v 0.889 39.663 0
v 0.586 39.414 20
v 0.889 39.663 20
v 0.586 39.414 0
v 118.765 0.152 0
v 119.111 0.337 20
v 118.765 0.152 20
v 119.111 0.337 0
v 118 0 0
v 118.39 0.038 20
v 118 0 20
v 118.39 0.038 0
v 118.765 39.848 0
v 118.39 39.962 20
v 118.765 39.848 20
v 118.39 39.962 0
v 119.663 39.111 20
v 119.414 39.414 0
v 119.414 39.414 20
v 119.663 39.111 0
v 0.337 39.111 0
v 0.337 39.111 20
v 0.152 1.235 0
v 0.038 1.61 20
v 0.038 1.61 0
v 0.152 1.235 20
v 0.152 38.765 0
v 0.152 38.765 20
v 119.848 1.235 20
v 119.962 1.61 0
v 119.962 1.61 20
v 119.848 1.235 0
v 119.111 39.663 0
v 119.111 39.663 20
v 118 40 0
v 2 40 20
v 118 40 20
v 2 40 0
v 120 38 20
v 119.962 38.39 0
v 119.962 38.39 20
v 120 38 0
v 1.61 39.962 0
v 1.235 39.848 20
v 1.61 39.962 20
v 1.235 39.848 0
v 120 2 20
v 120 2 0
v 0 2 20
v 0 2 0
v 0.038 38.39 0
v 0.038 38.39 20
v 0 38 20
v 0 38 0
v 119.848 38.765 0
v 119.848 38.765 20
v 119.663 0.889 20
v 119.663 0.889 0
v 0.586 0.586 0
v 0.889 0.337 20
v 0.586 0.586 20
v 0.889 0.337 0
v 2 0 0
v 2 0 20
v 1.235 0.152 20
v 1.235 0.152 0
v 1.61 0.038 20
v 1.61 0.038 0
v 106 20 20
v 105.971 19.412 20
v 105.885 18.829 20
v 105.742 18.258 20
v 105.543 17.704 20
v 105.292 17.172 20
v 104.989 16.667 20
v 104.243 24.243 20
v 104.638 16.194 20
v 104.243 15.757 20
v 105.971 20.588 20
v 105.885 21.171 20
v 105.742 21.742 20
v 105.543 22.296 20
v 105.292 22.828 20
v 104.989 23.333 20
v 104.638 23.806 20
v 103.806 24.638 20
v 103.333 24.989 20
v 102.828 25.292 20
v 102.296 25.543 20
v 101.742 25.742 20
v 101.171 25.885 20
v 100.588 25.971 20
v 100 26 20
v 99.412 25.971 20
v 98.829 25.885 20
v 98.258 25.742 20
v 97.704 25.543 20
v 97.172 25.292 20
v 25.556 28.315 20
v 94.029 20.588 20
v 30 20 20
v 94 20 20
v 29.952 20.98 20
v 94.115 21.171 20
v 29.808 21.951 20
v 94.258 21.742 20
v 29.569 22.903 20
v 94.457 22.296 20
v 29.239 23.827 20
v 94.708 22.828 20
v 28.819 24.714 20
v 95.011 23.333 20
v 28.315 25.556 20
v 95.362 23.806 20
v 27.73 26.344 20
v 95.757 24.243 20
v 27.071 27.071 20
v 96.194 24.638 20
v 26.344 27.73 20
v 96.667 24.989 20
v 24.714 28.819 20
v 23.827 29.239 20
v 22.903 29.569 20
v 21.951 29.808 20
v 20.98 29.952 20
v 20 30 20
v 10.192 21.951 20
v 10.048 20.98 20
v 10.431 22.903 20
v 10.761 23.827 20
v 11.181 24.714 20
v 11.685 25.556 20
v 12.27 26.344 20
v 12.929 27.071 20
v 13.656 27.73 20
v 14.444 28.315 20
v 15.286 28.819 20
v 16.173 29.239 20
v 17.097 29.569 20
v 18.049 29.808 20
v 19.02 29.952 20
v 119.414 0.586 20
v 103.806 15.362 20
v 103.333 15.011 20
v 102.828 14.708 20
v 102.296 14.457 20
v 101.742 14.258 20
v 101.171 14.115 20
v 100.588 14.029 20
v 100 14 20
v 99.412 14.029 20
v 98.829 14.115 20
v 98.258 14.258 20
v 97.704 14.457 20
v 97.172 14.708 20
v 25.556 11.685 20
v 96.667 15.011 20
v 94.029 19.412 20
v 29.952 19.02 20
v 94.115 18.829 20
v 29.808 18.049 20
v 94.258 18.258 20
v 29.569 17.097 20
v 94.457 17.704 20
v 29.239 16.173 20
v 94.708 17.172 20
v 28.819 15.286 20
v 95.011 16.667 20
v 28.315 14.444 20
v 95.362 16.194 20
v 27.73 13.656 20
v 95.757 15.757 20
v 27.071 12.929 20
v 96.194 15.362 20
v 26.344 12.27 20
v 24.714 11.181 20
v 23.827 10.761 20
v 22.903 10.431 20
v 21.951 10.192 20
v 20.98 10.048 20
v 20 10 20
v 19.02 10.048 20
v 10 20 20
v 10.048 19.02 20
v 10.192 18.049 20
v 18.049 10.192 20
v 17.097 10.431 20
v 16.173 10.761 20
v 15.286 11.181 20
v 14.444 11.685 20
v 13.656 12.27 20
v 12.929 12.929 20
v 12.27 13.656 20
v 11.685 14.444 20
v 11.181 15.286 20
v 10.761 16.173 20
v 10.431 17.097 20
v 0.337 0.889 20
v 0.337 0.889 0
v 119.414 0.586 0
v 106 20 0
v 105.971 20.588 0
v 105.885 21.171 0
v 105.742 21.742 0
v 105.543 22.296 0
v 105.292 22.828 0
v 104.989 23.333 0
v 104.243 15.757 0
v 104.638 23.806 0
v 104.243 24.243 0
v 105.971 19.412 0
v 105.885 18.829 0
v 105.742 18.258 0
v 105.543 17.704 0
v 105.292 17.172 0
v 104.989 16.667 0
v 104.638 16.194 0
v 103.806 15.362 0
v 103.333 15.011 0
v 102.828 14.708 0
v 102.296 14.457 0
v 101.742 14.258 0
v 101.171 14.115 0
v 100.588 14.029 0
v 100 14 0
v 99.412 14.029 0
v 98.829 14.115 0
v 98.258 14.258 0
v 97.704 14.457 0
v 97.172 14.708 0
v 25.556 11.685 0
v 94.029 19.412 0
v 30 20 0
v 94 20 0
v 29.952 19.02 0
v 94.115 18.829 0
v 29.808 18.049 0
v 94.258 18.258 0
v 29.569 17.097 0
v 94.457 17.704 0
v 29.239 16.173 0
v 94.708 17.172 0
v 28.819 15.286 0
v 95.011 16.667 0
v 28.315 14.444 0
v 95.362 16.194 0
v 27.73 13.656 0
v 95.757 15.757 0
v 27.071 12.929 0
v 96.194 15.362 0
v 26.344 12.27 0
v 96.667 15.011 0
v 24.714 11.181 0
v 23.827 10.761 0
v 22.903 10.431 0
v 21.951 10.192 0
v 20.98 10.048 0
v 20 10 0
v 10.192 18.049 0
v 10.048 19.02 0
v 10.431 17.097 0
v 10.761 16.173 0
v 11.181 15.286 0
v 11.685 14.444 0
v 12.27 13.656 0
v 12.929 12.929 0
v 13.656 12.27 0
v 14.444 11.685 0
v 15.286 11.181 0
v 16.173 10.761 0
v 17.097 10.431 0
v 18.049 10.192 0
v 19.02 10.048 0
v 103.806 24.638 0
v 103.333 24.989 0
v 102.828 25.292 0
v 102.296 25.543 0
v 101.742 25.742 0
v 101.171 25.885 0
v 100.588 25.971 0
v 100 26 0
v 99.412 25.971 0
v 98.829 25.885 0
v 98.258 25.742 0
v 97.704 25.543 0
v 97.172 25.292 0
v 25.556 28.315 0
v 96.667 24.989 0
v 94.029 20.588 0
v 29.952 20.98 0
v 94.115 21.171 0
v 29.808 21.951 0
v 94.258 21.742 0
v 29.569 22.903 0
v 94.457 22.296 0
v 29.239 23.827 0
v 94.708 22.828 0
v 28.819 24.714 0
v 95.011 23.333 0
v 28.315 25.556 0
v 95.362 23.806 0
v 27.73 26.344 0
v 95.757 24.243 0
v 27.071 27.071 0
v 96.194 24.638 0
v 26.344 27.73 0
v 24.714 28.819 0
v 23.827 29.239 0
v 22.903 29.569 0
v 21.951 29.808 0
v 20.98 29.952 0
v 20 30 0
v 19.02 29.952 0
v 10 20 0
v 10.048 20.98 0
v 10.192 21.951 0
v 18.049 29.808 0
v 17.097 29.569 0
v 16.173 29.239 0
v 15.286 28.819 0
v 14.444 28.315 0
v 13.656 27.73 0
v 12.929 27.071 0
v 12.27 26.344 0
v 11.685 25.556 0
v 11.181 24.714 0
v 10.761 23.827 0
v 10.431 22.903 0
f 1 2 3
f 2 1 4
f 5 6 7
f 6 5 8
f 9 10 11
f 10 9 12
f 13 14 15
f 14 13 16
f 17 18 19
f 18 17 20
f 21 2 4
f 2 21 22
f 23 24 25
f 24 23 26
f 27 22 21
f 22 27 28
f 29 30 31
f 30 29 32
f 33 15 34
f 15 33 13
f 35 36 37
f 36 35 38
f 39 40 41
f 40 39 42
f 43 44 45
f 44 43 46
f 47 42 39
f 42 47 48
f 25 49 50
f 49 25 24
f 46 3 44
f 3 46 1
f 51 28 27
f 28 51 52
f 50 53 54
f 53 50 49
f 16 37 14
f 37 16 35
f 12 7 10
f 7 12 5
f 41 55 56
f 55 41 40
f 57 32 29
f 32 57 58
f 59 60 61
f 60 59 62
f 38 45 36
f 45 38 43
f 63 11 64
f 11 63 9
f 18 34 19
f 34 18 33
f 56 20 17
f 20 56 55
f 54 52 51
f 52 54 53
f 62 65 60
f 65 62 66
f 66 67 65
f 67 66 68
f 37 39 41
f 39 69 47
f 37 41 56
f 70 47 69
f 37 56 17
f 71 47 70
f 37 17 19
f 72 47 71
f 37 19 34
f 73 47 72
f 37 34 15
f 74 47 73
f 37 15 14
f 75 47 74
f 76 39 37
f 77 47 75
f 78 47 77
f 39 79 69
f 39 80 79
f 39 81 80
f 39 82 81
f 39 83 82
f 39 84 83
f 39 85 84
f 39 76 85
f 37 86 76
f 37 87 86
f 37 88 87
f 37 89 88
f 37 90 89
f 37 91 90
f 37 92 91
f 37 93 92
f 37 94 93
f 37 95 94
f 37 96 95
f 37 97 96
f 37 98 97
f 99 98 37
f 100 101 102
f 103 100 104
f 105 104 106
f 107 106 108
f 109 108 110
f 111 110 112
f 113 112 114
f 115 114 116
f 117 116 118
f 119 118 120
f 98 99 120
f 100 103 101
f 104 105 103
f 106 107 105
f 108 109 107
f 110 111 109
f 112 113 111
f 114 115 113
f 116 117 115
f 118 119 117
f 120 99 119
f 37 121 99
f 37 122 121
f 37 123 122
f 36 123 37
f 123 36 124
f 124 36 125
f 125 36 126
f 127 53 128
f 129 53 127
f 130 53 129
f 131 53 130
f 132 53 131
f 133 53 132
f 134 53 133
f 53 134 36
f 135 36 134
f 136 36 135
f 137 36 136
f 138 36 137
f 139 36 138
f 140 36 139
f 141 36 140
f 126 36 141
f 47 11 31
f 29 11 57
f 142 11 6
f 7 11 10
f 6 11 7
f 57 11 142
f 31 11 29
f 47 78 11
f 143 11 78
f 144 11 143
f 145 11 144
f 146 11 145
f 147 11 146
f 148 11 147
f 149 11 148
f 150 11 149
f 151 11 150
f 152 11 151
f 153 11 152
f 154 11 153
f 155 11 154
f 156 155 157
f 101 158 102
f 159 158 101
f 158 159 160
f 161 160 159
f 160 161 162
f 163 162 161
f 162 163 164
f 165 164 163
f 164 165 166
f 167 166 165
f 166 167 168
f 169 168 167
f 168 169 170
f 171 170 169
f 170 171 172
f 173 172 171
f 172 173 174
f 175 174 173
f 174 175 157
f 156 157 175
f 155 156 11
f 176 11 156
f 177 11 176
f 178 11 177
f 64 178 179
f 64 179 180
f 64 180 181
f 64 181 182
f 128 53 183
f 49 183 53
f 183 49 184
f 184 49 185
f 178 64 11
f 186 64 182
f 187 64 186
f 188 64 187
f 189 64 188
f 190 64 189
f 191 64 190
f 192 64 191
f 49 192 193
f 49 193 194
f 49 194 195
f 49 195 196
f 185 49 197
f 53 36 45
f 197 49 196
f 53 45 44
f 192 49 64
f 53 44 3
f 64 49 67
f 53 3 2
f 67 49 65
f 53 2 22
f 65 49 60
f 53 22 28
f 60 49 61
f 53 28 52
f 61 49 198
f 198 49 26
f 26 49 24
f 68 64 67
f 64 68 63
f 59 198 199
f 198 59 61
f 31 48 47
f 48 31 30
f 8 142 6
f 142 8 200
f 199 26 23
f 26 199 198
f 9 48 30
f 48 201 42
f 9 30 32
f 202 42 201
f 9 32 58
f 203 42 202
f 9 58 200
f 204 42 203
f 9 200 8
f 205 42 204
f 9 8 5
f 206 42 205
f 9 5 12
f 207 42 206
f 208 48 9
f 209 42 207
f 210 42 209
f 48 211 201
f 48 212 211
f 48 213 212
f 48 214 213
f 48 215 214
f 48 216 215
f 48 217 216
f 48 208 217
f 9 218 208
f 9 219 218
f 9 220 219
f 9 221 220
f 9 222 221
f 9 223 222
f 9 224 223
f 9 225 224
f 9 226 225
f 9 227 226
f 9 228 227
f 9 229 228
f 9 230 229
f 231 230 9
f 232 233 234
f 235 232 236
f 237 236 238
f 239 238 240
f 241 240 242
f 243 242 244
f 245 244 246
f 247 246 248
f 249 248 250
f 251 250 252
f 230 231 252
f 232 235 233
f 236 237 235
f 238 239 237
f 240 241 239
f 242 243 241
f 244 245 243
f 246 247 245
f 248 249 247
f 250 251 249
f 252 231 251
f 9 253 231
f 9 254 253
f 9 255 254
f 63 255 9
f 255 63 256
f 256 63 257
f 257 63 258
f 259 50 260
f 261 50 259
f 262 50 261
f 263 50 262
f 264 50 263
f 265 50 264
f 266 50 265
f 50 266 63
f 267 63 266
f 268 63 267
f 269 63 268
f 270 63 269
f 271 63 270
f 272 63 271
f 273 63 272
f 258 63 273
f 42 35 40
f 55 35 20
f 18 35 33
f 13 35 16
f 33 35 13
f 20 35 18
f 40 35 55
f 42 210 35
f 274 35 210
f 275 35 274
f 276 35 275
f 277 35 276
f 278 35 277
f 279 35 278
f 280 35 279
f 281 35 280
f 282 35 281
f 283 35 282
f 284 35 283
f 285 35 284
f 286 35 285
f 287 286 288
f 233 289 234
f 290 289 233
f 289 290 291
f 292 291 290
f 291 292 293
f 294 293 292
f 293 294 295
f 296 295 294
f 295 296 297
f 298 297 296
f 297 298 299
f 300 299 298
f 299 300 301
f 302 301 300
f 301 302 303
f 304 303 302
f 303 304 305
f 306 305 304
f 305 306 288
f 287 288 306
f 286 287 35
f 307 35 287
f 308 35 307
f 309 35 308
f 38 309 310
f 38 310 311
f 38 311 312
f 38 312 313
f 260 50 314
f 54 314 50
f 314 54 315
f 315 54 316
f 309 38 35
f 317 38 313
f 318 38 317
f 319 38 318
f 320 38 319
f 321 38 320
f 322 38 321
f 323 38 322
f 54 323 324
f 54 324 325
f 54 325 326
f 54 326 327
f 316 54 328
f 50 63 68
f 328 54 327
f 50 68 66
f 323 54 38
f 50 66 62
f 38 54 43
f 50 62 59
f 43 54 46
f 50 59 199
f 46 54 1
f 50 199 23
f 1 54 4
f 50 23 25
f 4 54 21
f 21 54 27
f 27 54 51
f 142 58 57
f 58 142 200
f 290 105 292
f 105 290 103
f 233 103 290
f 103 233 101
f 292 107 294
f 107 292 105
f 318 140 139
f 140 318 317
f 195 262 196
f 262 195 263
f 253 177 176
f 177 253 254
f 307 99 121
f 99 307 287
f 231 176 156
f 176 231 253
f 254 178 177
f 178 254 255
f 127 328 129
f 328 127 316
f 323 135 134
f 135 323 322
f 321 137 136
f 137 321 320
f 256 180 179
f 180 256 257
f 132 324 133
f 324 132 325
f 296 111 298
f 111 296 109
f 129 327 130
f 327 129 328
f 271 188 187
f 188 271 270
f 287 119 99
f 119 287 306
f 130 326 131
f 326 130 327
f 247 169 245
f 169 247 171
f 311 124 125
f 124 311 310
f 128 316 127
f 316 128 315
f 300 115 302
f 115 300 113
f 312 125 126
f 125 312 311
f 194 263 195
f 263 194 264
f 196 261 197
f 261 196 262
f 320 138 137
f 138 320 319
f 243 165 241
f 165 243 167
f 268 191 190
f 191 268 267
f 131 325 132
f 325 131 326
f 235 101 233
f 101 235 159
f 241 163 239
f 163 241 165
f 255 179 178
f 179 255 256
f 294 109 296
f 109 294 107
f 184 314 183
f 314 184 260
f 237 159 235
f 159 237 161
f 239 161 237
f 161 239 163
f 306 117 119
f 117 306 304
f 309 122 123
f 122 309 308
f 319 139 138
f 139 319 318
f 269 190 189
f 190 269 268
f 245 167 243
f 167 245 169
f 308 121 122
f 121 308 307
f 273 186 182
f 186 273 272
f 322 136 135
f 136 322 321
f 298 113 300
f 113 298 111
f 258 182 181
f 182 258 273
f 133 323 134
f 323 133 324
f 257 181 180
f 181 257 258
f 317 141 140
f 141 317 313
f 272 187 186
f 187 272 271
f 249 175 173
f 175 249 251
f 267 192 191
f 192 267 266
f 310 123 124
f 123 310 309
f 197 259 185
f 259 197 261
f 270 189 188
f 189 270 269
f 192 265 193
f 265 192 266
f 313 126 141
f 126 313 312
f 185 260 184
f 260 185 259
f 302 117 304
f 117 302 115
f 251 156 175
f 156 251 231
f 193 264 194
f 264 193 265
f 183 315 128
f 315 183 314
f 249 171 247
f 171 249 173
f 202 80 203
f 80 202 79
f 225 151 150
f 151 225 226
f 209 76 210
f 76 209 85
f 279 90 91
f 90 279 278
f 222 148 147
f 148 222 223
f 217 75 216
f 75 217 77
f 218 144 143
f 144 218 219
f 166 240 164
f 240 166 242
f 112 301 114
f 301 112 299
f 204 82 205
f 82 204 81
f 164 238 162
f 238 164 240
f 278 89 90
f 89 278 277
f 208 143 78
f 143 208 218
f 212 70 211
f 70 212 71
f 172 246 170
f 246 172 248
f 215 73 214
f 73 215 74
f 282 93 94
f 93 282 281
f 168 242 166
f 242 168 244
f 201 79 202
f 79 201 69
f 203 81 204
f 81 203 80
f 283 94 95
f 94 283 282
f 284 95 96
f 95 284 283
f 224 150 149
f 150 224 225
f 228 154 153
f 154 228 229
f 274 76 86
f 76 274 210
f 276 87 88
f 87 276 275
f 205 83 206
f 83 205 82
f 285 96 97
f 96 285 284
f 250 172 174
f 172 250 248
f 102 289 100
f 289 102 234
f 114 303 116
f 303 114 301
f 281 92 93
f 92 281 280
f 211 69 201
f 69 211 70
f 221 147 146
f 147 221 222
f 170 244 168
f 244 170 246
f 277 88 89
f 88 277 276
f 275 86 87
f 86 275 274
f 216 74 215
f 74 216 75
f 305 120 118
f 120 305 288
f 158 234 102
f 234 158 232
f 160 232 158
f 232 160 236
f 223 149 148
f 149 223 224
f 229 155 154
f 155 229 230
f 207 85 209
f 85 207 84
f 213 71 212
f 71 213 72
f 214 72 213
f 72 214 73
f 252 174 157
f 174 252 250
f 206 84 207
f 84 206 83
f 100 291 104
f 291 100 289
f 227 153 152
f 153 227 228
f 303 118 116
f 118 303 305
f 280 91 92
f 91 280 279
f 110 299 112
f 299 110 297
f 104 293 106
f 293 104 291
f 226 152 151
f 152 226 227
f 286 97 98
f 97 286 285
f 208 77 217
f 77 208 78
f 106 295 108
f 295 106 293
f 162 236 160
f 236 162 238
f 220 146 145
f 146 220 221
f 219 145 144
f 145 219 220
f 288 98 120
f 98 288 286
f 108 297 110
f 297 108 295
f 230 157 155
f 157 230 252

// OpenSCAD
// conrod.scad — connecting rod for topology optimization
// Flat plate envelope with two pin bores (cylinder_z through Z thickness).
// SIMP optimizes the web between the large (fixed) and small (load) bosses.
//
// Coordinate convention (matches params.json):
//   X — long axis (LENGTH), large boss at x_min, small boss at x_max
//   Y — width axis (WIDTH)
//   Z — thickness axis (HEIGHT)

// ── Papermill-injectable parameters ──────────────────────────────────────────
LENGTH             = 120.0;   // mm — total envelope length
WIDTH              =  40.0;   // mm — total envelope width
HEIGHT             =  20.0;   // mm — total envelope thickness (Z)
LARGE_BORE_D       =  20.0;   // mm — fixed-end pin bore diameter
SMALL_BORE_D       =  12.0;   // mm — load-end pin bore diameter
BORE_INSET         =  20.0;   // mm — bore centre distance from each end face
WALL_THICKNESS     =   3.0;   // mm — minimum wall around each bore
FILLET_RADIUS      =   2.0;   // mm — edge fillet on envelope

// ── Derived ───────────────────────────────────────────────────────────────────
large_cx = BORE_INSET;
small_cx = LENGTH - BORE_INSET;
bore_cy  = WIDTH / 2.0;

module boss(cx, d, wall) {
    // Solid cylinder at bore centre — nondesign region in optimizer
    translate([cx, bore_cy, 0])
        cylinder(h=HEIGHT, d=d + 2*wall, center=false, $fn=64);
}

module bore(cx, d) {
    translate([cx, bore_cy, -1])
        cylinder(h=HEIGHT + 2, d=d, center=false, $fn=64);
}

difference() {
    union() {
        // Main envelope block
        translate([FILLET_RADIUS, FILLET_RADIUS, 0])
            minkowski() {
                cube([LENGTH - 2*FILLET_RADIUS,
                      WIDTH  - 2*FILLET_RADIUS,
                      HEIGHT - FILLET_RADIUS]);
                cylinder(r=FILLET_RADIUS, h=FILLET_RADIUS, $fn=32);
            }
        // Boss pads — ensure wall material around bores
        boss(large_cx, LARGE_BORE_D, WALL_THICKNESS);
        boss(small_cx, SMALL_BORE_D, WALL_THICKNESS);
    }
    // Subtract pin bores through full Z
    bore(large_cx, LARGE_BORE_D);
    bore(small_cx, SMALL_BORE_D);
}
